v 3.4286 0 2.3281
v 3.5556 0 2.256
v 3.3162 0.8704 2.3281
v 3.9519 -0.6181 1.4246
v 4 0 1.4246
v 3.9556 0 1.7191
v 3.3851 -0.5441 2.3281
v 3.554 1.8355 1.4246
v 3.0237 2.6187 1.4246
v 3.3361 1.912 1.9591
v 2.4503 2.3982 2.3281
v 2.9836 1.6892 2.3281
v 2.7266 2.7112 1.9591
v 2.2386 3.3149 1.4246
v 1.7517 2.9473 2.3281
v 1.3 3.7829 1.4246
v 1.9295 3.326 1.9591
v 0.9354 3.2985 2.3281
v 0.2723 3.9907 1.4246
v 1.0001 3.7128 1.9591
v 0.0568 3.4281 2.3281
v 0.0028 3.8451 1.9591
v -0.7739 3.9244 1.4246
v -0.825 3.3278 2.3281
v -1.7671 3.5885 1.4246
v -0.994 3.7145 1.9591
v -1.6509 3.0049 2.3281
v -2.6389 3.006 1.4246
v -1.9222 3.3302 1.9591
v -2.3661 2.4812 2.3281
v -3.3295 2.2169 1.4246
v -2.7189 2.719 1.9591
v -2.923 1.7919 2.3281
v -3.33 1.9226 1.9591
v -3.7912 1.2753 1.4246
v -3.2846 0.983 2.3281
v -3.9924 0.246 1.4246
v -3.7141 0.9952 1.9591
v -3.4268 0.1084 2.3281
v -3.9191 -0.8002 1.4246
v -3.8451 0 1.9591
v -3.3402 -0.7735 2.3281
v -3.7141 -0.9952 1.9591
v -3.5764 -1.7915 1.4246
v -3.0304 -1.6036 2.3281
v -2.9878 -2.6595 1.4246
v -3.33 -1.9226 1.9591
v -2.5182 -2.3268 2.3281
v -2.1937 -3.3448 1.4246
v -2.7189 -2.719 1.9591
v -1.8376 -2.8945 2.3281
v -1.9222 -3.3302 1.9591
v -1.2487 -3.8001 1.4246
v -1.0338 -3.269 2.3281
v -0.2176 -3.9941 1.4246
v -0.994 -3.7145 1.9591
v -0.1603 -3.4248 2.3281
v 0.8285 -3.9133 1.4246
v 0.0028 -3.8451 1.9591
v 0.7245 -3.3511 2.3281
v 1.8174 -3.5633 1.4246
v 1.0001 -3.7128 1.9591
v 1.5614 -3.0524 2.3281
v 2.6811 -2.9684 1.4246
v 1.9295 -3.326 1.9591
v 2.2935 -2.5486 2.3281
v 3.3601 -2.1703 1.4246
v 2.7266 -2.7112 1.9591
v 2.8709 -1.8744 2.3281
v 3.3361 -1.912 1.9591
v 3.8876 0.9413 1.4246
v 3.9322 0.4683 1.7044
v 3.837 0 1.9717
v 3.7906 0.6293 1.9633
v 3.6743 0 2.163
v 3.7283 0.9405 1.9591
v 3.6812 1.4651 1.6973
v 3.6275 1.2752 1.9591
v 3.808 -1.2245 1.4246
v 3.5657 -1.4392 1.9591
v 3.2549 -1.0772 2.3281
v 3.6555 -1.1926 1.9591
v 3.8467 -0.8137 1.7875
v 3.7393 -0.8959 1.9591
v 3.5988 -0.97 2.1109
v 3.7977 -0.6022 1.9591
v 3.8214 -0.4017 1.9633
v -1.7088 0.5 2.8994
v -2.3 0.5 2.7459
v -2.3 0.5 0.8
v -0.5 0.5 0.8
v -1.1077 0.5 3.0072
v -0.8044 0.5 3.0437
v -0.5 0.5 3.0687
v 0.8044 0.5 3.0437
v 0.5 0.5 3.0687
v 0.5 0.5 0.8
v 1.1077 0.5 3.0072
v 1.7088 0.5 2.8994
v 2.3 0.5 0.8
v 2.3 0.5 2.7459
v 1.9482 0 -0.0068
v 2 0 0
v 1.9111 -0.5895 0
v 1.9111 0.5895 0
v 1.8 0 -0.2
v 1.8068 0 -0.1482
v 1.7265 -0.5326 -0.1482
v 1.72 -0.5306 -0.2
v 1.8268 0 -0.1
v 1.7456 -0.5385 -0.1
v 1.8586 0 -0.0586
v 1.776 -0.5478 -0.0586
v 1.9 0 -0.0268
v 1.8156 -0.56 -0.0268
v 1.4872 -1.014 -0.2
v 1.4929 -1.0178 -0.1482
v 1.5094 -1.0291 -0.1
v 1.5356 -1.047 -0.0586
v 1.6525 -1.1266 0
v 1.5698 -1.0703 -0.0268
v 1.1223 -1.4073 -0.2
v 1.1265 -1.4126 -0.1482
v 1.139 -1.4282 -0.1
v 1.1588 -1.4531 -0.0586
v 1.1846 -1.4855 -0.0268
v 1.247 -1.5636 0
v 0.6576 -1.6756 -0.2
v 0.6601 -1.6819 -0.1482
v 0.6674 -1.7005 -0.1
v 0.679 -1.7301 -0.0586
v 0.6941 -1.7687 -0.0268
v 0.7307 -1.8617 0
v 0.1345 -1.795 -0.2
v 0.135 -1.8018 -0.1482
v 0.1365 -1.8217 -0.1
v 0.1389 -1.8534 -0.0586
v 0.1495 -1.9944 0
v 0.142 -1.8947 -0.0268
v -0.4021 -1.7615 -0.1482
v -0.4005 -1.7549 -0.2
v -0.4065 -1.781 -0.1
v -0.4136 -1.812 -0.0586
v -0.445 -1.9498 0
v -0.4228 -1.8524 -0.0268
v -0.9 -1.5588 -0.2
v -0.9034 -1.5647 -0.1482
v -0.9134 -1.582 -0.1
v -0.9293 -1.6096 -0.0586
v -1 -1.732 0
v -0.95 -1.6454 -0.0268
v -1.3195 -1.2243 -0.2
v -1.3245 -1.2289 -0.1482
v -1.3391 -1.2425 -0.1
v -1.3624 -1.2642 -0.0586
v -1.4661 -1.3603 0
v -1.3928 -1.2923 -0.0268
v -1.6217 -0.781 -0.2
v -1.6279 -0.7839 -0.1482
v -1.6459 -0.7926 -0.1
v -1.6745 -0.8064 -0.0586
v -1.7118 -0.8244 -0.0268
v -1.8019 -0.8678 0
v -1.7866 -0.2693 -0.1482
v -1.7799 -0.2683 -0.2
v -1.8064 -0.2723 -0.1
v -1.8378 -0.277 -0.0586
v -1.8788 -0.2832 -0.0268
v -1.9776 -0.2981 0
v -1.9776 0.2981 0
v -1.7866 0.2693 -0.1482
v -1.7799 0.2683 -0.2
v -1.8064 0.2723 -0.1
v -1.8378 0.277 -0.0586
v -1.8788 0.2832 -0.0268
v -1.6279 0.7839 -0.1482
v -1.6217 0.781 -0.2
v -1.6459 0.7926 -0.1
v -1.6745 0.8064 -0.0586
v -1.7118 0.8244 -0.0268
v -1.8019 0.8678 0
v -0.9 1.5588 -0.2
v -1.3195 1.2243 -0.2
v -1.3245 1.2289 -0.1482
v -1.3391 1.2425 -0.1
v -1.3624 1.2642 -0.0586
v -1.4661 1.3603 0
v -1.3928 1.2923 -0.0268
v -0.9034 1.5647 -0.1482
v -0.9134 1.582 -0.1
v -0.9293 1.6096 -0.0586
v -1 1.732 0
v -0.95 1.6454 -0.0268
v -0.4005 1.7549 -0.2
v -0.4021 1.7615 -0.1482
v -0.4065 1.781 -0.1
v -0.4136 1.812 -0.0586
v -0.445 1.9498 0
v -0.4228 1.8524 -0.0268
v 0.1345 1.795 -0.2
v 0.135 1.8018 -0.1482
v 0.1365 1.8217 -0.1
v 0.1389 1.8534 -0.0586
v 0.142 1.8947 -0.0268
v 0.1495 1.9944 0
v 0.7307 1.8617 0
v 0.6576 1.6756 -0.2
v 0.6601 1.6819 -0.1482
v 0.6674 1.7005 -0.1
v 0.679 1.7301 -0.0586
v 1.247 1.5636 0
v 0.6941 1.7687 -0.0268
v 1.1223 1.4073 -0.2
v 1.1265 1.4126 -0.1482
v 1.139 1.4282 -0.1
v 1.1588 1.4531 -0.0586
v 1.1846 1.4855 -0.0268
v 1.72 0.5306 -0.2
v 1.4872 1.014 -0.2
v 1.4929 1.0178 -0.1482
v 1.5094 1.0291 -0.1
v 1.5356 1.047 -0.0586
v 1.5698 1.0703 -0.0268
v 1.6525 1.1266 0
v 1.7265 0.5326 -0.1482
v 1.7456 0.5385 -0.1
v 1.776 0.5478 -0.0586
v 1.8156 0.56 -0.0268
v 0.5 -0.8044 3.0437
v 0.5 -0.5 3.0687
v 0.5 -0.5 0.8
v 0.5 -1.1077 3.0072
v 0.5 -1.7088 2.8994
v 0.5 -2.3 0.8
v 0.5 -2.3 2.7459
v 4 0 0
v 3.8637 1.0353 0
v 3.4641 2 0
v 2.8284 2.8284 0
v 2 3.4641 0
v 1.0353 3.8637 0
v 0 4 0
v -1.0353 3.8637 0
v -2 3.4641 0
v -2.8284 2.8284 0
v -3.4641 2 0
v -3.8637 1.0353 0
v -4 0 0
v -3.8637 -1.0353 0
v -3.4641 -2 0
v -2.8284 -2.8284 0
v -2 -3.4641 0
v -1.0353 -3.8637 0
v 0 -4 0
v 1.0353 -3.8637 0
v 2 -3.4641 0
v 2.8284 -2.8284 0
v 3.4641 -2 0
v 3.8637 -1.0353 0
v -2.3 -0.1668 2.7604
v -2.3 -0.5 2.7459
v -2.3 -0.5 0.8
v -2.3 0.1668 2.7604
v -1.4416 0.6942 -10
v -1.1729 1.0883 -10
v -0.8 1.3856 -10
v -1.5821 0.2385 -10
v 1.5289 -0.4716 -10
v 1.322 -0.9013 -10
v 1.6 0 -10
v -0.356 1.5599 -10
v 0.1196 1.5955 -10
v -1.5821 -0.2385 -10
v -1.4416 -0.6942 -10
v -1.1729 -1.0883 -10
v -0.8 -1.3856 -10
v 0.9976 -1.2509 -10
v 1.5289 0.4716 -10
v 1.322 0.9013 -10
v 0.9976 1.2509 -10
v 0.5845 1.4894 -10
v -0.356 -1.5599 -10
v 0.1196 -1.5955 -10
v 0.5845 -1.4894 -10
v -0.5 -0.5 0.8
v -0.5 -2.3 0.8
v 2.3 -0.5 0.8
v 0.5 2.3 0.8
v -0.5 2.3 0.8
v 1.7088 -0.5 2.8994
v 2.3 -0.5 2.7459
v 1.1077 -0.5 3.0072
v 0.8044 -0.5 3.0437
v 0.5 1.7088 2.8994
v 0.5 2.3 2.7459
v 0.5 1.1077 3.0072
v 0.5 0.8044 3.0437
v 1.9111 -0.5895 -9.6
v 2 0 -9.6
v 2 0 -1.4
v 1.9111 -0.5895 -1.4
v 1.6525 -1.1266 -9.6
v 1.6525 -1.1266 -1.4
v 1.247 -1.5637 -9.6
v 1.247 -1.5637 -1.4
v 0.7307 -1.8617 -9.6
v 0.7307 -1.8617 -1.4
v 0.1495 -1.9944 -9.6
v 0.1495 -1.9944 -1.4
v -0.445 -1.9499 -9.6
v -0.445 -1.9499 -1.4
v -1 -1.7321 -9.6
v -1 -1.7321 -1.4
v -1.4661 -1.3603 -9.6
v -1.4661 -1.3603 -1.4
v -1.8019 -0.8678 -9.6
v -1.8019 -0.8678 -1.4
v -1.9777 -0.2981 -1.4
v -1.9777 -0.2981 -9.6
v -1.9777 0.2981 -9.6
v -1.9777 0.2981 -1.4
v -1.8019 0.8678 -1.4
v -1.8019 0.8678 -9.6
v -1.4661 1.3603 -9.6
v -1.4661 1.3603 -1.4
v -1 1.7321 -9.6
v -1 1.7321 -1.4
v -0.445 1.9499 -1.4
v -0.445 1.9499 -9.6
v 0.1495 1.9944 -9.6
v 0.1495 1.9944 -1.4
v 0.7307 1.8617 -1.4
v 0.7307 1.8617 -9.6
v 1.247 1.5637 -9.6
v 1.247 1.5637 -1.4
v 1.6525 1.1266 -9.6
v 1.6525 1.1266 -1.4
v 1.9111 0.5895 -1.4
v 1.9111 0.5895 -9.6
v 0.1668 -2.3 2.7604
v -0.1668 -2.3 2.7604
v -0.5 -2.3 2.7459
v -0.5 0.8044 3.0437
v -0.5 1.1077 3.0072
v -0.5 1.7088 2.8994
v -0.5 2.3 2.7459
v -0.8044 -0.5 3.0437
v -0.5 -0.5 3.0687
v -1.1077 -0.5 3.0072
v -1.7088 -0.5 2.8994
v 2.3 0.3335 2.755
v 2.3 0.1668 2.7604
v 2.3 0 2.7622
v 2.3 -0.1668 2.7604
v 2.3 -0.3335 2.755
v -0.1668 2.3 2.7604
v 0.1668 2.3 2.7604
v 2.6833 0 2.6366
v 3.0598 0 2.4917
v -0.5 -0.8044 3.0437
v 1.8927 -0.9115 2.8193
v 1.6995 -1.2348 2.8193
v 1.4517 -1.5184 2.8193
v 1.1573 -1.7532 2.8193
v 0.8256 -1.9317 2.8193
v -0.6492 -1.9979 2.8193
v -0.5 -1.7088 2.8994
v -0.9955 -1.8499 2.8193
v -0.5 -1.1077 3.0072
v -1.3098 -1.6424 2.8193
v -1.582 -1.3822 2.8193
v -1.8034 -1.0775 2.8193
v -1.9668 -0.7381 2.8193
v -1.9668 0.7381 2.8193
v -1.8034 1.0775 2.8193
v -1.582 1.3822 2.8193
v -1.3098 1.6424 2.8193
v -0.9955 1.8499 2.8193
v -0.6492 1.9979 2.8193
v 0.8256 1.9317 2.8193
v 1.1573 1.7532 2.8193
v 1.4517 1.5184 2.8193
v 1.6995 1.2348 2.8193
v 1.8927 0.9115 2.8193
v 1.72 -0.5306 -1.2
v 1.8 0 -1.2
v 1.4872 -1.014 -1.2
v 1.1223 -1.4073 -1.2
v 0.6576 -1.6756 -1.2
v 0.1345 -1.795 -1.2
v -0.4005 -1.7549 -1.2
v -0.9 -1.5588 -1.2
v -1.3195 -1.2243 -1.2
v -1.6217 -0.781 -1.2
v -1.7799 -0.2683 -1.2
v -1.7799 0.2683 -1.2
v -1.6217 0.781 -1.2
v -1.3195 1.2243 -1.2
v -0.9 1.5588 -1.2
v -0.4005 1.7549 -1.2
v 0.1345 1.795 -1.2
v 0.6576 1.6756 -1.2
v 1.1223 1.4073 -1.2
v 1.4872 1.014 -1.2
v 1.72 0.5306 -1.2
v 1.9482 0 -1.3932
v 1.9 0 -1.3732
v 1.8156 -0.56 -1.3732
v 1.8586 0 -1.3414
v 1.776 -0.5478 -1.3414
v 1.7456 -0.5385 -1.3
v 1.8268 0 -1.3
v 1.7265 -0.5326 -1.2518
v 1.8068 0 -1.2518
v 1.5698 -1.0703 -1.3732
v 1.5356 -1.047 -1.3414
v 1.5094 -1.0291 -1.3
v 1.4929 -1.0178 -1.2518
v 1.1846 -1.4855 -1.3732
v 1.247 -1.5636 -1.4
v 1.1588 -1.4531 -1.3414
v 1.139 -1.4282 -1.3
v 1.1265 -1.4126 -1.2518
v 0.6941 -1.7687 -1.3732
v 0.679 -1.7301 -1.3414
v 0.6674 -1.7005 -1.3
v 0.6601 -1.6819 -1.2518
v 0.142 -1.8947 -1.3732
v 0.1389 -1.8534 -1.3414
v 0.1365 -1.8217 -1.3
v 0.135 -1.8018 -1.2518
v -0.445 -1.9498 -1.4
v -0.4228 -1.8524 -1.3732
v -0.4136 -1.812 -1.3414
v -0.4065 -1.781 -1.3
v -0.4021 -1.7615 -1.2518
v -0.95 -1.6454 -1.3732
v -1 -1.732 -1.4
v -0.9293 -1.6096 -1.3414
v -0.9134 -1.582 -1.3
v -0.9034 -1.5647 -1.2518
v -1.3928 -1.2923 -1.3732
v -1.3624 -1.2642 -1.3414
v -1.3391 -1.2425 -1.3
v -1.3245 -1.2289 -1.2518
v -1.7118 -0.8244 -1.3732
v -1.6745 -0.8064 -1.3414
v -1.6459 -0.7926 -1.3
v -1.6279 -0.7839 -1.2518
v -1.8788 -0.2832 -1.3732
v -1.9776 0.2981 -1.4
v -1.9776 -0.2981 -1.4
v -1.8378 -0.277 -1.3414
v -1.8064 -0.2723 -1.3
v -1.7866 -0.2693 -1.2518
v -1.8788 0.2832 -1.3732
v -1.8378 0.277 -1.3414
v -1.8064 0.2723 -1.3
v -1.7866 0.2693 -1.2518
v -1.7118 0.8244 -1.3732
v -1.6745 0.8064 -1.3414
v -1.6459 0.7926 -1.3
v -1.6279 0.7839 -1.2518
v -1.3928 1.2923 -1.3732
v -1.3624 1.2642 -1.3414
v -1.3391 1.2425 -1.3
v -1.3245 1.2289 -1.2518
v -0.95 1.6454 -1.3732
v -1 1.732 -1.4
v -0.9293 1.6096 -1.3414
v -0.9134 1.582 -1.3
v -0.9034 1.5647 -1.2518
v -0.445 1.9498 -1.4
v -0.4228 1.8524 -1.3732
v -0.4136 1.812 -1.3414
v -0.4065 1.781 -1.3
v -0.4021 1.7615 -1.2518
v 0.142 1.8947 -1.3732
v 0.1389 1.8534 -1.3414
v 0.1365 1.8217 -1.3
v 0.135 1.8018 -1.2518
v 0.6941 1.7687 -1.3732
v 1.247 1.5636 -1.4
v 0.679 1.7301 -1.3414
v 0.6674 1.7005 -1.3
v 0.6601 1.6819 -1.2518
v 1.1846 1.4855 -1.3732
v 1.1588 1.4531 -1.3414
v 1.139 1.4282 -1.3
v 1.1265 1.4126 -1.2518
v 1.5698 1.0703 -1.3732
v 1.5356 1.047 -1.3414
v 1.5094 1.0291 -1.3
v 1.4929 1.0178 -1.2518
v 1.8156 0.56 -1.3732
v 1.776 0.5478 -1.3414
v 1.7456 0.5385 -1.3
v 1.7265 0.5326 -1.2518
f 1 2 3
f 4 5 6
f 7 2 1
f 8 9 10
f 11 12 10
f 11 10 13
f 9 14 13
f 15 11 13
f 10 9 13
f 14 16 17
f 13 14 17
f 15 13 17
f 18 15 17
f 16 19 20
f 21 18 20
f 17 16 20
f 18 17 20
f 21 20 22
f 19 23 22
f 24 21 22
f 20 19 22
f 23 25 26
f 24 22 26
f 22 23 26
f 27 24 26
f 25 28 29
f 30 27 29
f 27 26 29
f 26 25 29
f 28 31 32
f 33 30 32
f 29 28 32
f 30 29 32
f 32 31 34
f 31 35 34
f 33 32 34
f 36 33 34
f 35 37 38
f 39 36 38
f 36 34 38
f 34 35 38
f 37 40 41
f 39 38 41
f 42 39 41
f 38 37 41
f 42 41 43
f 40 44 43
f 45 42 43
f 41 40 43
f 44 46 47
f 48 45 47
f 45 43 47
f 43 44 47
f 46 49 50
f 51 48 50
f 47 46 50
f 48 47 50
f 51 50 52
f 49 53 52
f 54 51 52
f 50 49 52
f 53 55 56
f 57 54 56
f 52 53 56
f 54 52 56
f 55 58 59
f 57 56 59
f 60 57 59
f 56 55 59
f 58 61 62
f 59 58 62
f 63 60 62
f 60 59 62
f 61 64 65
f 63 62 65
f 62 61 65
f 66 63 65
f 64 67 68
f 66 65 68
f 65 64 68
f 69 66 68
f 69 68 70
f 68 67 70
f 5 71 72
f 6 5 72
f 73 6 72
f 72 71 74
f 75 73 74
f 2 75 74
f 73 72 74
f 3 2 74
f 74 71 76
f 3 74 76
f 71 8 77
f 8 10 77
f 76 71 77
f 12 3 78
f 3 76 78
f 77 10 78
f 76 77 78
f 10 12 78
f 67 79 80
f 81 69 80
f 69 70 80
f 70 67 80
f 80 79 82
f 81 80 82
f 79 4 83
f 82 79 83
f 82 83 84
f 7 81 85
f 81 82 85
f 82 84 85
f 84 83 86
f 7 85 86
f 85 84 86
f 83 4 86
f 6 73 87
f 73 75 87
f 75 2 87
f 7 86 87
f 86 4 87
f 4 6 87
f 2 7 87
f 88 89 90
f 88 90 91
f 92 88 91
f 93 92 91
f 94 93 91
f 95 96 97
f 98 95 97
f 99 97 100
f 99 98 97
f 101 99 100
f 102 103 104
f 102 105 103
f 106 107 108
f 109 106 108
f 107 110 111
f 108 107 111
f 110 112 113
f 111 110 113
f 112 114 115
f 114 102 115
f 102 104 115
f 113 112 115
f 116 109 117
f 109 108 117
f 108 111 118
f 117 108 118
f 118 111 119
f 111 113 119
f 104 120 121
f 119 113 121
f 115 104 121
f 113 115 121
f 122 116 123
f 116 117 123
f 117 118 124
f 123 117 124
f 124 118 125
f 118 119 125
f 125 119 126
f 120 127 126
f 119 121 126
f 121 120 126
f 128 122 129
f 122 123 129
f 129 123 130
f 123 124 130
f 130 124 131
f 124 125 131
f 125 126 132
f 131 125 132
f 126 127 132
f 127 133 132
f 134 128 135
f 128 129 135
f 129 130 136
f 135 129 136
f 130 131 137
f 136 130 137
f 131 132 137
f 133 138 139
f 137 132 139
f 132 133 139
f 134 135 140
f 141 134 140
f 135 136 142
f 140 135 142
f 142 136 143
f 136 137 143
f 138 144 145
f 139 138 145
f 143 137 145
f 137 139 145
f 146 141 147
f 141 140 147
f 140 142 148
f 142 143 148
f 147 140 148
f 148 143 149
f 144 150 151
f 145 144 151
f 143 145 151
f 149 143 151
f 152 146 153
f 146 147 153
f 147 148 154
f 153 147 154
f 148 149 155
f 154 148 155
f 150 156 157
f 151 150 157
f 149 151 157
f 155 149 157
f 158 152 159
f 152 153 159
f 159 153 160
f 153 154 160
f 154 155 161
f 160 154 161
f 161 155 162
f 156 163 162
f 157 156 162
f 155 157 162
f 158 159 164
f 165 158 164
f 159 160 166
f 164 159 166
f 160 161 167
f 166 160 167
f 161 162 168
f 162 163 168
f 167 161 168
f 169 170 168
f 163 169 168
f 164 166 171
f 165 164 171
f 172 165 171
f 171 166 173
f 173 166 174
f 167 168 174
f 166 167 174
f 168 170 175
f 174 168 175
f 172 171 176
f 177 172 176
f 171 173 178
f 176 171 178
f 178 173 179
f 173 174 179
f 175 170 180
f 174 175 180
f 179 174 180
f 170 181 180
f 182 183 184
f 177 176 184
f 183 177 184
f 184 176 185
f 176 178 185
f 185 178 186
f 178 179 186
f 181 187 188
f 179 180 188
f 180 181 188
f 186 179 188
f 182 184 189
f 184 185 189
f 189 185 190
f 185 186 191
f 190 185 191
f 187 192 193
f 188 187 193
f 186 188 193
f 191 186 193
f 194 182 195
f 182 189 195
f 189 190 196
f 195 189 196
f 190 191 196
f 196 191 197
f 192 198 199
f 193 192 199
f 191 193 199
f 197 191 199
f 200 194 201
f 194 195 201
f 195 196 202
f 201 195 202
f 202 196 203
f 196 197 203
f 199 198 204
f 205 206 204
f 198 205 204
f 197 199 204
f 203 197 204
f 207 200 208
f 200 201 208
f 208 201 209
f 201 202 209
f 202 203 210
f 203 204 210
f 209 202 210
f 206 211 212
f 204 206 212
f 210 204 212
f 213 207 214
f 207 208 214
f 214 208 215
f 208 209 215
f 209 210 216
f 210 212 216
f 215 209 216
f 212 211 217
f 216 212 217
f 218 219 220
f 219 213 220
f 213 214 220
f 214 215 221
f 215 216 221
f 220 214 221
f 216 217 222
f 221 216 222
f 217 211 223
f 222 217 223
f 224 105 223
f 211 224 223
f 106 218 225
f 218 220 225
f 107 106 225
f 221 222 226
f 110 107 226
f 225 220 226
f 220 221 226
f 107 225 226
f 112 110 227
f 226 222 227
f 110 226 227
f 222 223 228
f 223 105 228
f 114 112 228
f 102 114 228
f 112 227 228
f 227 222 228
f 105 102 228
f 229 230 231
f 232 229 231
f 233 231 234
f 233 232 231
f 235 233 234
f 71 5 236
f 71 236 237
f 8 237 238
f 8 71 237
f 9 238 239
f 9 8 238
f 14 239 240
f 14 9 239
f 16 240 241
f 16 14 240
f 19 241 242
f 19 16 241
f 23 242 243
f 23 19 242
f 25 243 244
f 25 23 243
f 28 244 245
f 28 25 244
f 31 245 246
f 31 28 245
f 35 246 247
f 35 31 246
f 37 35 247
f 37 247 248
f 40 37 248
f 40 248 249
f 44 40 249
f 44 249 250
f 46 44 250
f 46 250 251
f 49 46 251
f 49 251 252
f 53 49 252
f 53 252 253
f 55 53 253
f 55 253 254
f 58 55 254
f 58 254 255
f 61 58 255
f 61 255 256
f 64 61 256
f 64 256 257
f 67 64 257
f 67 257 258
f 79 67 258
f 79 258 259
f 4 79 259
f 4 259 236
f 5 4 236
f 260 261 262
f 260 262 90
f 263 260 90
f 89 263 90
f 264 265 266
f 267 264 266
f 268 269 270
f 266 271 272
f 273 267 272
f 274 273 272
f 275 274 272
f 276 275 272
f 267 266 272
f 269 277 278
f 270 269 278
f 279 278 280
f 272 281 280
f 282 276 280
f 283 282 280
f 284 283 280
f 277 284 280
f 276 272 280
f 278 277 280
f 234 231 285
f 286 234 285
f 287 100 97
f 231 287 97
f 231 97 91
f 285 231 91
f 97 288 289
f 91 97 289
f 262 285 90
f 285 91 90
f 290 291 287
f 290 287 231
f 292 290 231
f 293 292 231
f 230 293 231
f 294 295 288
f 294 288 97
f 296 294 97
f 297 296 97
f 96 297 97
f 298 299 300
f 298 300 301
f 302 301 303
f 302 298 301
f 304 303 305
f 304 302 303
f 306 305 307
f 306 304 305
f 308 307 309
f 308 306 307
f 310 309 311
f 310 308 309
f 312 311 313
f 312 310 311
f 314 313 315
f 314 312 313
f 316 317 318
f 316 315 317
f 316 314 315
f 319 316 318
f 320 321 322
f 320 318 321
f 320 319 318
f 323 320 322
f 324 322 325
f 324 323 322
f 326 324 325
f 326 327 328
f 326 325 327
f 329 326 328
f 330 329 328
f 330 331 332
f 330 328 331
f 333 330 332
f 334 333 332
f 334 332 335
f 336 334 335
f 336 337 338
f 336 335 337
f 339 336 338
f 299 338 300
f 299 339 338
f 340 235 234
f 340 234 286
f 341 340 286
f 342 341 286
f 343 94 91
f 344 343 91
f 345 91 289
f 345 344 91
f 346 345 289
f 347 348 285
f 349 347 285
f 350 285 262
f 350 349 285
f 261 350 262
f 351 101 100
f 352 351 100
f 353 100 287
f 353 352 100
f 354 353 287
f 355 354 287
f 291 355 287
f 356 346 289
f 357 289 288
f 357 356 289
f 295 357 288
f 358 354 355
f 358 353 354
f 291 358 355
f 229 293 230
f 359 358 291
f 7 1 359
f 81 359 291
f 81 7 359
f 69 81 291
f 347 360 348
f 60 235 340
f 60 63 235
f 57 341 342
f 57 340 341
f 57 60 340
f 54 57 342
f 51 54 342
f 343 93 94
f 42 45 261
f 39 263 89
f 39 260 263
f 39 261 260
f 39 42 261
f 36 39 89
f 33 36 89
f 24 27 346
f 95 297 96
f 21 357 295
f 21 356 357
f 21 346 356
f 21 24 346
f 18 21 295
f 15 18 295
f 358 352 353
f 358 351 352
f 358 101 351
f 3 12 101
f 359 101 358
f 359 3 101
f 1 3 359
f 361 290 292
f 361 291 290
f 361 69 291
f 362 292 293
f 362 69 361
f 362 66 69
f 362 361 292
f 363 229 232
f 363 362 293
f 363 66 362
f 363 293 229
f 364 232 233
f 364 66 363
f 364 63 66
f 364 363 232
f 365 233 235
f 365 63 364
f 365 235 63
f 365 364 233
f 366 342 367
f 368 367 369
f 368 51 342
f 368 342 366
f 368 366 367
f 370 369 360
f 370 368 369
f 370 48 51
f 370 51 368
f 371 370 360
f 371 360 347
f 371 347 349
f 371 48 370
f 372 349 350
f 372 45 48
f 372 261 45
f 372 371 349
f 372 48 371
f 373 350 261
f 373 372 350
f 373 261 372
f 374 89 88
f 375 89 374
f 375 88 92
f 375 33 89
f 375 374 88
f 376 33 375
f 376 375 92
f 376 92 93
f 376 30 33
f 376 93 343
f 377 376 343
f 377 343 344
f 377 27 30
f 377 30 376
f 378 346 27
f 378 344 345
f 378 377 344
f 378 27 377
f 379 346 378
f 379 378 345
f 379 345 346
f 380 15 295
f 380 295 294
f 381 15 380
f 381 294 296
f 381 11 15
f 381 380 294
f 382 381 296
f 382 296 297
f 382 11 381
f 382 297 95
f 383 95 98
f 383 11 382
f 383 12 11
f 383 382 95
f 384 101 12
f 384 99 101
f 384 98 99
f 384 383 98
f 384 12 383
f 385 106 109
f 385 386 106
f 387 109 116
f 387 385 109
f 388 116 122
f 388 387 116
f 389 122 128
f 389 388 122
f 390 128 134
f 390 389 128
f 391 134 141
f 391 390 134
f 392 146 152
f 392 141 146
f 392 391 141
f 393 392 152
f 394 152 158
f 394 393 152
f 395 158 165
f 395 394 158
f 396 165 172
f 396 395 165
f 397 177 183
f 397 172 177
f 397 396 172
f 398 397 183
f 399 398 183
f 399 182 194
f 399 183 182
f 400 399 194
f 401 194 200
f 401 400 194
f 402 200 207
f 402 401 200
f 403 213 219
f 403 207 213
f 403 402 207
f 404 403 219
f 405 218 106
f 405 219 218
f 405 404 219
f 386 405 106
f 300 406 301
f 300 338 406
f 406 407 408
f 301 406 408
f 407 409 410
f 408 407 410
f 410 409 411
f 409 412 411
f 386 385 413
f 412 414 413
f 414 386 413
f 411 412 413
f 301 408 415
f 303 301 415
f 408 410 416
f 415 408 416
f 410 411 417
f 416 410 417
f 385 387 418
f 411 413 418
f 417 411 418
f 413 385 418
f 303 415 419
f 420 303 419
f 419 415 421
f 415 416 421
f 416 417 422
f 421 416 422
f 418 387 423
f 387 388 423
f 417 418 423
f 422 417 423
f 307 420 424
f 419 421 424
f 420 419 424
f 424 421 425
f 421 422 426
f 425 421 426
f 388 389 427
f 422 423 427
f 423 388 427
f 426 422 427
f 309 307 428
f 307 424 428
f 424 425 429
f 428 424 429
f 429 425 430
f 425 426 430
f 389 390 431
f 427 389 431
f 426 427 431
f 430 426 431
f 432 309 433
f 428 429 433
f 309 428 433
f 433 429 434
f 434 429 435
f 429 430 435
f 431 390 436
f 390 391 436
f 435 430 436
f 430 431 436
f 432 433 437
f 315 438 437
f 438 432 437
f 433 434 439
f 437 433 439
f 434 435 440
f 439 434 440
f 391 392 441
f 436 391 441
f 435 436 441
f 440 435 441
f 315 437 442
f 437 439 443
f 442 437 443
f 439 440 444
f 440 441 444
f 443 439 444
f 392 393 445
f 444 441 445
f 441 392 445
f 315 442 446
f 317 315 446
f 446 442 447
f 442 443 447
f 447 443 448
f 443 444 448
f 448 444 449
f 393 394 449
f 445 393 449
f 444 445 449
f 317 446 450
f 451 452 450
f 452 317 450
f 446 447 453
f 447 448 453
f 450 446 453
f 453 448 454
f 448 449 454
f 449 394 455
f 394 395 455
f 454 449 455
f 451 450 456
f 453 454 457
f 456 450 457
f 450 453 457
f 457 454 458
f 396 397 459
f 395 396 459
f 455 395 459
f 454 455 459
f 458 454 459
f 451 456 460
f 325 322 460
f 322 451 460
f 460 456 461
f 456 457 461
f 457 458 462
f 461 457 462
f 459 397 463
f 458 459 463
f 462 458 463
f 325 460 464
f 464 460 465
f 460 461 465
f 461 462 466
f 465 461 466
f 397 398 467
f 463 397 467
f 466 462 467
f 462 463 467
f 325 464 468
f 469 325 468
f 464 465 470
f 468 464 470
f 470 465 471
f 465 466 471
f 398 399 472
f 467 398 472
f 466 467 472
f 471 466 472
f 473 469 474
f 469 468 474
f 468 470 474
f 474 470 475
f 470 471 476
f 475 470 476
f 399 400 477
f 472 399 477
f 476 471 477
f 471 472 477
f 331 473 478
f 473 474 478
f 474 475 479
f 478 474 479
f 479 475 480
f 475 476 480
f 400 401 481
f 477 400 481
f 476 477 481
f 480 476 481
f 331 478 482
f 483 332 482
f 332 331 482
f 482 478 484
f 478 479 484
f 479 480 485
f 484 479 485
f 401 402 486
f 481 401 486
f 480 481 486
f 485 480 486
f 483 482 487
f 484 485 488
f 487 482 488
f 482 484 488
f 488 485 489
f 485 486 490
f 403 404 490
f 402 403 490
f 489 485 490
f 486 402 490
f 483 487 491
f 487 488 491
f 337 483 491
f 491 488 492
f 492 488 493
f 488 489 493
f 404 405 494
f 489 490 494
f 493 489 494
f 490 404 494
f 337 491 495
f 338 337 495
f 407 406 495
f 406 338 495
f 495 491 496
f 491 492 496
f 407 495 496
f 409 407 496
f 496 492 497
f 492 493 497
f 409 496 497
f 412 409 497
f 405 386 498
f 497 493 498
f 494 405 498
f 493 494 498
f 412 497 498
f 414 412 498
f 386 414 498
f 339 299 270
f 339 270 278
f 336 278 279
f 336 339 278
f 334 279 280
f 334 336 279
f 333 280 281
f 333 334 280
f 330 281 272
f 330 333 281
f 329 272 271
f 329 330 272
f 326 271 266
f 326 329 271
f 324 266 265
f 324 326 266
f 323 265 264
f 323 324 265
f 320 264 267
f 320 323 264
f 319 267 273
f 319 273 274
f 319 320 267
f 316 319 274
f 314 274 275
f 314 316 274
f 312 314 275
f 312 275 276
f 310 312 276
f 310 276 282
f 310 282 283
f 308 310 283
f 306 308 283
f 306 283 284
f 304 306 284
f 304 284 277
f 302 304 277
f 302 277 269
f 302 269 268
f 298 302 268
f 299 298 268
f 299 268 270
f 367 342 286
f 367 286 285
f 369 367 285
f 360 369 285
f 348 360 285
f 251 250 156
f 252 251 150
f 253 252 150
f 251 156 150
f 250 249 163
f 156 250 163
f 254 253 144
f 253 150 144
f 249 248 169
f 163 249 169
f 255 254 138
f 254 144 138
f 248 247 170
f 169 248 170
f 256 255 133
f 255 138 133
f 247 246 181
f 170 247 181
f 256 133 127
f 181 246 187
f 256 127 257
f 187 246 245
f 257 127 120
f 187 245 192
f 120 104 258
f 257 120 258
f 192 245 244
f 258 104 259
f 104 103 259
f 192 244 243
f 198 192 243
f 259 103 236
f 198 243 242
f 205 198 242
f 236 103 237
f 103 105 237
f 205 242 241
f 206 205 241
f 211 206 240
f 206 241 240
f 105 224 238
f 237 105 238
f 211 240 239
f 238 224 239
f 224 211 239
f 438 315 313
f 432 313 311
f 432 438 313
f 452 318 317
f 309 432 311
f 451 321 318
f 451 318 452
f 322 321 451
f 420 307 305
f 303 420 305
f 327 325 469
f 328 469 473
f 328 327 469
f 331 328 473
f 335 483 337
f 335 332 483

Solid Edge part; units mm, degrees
sketch "Sketch1" plane through (0, 0, 0) normal (0, -1, 0) x (1, 0, 0)
  line L0 (4, 0) -> (1.8, 0)
  line L1 (1.8, 0) -> (1.8, -1.4)
  line L2 (1.8, -1.4) -> (2, -1.4)
  line L3 (2, -1.4) -> (2, -10)
  line L4 (2, -10) -> (0, -10)
  arc A0 (0, 3.1) -> (4, 2.0282) centre (0, -4.9) cw
  line L5 (4, 0) -> (4, 2.0282)
  dimension "D1" = 10
  dimension "D2" = 1.4
  dimension "D3" = 0.2
  dimension "D4" = 8
  dimension "D5" = 3.1
revolve "RevolvedProtrusion1" add sketch "Sketch1" angle 360 about axis through (0, 0, -6) along (0, 0, 1)
cosmetic_thread "Thread1" size "M4"
chamfer "Chamfer_1" distance 0.4 angle 45 1 edges at (-2, 0, -10)
fillet "Round1" radius 0.2 2 edges at (-1.8, 0, -1.4) (-1.8, 0, 0)
fillet "Round_3" radius 1 1 edges at (-4, 0, 2.0282)
sketch "Sketch2" plane through (0, 0, 3.1) normal (0, 0, 1) x (1, 0, 0)
  line L0 (-0.5, 0.5) -> (-0.5, 2.3)
  line L1 (-0.5, 2.3) -> (0.5, 2.3)
  line L2 (0.5, 2.3) -> (0.5, 0.5)
  line L3 (0.5, 0.5) -> (2.3, 0.5)
  line L4 (2.3, 0.5) -> (2.3, -0.5)
  line L5 (2.3, -0.5) -> (0.5, -0.5)
  line L6 (0.5, -0.5) -> (0.5, -2.3)
  line L7 (0.5, -2.3) -> (-0.5, -2.3)
  line L8 (-0.5, -2.3) -> (-0.5, -0.5)
  line L9 (-0.5, -0.5) -> (-2.3, -0.5)
  line L10 (-2.3, -0.5) -> (-2.3, 0.5)
  line L11 (-2.3, 0.5) -> (-0.5, 0.5)
  dimension "D1" = 4.6
  dimension "D2" = 1
extrude "ExtrudedCutout_2" cut sketch "Sketch2" against normal blind 2.3
properties part number "STD-DIN7985-M4x10" material "Galvanized steel"
